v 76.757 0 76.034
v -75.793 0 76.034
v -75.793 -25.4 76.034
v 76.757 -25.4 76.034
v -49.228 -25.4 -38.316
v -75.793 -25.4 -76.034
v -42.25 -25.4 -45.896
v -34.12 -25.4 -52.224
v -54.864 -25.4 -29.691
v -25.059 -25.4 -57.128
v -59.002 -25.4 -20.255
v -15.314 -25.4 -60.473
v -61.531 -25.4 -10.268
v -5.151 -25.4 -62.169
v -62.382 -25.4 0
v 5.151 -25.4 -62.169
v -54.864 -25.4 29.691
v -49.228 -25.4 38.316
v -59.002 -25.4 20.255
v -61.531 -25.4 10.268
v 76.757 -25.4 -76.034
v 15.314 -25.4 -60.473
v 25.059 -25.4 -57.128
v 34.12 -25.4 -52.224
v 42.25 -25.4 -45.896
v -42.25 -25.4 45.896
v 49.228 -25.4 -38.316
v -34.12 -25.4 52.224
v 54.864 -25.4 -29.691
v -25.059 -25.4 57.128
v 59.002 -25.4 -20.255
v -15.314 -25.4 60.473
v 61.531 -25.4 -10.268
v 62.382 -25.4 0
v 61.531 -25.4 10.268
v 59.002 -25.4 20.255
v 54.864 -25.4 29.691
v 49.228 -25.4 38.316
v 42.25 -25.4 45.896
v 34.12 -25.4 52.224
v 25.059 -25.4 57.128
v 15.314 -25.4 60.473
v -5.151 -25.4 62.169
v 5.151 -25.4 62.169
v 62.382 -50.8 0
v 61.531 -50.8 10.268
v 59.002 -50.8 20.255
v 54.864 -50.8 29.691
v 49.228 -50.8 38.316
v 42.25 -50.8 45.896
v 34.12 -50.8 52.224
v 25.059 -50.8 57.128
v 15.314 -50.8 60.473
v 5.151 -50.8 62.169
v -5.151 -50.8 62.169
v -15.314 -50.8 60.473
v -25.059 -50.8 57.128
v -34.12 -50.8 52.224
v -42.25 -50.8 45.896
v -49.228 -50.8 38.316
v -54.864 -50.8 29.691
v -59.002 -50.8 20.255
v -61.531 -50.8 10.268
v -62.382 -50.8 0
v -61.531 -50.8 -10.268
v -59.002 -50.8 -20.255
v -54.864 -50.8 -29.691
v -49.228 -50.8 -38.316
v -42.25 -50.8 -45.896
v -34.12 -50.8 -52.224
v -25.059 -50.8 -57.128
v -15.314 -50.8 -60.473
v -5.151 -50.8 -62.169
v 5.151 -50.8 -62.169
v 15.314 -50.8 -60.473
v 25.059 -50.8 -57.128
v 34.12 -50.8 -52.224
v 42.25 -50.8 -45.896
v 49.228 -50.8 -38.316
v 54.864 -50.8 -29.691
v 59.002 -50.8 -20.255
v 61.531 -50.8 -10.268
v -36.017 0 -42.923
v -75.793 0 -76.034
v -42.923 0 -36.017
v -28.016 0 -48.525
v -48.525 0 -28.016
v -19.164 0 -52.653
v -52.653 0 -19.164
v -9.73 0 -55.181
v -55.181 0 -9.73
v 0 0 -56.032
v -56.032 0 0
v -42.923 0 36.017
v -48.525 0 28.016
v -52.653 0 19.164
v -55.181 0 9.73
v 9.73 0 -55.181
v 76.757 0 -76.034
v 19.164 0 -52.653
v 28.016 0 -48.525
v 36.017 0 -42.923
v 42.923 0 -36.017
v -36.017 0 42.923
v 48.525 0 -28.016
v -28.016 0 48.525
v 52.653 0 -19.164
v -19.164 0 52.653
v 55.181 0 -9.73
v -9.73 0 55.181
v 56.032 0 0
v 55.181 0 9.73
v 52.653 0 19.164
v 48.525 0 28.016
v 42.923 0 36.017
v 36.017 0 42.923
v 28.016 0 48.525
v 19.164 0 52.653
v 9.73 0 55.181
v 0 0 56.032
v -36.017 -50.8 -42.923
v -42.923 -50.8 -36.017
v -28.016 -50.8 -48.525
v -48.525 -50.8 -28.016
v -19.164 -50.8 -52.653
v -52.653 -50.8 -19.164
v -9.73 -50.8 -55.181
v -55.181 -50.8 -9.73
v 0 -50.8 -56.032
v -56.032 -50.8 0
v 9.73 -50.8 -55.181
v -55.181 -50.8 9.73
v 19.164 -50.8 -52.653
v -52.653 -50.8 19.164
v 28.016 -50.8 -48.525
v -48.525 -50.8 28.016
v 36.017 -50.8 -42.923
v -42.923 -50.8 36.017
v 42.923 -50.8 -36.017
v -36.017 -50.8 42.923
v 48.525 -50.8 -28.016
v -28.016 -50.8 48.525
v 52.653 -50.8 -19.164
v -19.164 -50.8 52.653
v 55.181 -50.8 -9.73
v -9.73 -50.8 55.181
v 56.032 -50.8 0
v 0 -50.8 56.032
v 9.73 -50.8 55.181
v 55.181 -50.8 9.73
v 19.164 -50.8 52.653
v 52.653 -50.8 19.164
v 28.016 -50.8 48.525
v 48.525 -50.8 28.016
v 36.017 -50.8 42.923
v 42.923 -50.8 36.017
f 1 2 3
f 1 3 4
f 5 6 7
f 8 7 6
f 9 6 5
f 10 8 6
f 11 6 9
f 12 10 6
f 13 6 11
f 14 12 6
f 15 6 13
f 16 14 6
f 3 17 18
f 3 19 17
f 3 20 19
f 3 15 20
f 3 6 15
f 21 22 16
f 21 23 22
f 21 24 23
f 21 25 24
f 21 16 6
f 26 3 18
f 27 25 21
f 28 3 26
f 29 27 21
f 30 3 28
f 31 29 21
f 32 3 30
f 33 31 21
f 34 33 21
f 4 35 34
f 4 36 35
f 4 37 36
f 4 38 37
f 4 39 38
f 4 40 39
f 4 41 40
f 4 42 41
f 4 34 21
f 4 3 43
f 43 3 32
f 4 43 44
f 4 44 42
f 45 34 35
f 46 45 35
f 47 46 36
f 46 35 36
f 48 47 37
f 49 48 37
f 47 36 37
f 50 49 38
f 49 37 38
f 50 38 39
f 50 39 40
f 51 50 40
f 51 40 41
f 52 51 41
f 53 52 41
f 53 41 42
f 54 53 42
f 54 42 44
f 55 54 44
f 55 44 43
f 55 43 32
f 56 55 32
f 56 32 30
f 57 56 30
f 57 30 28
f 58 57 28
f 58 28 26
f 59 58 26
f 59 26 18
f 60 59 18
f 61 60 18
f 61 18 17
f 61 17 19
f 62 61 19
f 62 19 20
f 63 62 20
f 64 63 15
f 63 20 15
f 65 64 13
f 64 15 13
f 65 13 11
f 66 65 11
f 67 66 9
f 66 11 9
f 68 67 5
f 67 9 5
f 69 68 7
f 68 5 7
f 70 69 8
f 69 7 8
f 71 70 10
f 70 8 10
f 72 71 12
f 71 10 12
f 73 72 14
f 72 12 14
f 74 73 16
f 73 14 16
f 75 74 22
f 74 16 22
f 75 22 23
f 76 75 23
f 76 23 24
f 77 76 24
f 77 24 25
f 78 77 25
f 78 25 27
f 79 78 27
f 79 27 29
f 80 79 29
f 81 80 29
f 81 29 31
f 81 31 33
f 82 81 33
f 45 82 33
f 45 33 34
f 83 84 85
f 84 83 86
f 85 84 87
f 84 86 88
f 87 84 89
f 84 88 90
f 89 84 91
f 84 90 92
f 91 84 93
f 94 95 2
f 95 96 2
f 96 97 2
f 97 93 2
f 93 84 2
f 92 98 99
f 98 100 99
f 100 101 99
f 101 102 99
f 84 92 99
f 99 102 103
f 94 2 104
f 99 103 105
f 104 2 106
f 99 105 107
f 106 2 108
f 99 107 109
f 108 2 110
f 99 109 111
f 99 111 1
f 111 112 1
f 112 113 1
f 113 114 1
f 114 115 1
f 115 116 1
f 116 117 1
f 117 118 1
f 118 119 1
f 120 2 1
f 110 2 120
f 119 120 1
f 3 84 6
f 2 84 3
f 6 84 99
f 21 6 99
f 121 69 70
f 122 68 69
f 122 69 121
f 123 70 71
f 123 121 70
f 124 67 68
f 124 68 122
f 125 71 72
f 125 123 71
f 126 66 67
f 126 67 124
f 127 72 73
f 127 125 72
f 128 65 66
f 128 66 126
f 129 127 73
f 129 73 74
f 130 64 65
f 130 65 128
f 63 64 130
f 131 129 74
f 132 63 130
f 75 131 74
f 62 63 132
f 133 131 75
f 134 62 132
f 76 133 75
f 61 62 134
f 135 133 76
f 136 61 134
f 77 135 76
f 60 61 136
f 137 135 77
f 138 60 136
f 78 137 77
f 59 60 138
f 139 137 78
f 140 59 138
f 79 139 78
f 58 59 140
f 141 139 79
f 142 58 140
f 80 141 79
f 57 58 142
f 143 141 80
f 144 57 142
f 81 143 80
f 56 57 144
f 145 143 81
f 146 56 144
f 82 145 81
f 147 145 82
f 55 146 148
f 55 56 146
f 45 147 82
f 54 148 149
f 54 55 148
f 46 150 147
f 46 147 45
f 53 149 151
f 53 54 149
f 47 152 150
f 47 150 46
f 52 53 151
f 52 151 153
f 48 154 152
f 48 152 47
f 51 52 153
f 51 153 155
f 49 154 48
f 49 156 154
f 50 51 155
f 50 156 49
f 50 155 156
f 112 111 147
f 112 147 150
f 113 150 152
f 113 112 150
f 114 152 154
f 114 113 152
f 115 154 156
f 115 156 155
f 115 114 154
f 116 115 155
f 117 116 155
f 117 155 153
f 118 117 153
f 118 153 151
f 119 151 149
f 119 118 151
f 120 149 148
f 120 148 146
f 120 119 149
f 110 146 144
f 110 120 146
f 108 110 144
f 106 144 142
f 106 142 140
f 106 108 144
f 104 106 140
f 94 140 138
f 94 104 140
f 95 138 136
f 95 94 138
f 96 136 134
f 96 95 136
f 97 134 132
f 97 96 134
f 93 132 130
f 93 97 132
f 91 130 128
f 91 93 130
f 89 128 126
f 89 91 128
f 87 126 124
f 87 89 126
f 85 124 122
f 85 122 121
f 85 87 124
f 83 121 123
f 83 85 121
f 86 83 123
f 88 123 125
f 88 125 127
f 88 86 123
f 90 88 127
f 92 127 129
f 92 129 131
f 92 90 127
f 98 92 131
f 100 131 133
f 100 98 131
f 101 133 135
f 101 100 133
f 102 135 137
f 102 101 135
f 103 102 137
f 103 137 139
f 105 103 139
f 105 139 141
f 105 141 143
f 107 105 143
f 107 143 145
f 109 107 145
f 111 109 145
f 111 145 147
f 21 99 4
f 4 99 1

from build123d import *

# Parameters (mm, degrees)
F0_W     = 152.549193
F0_H     = 152.0672
F0_R     = 62.382267
F1_DEPTH = 25.4
F0_R_2   = 56.032267
F2_DEPTH = 50.8


with BuildPart() as f1:
    # F0 (on Front) → F1 (new body)
    with BuildSketch(Plane.XZ):
        with Locations((0.481986, 0)):
            Rectangle(F0_W, F0_H)
        Circle(F0_R, mode=Mode.SUBTRACT)
    extrude(amount=F1_DEPTH)

    # F0 (on Front) → F2 (join)
    with BuildSketch(Plane.XZ):
        Circle(F0_R)
        Circle(F0_R_2, mode=Mode.SUBTRACT)
    extrude(amount=F2_DEPTH)


solid = f1.part
